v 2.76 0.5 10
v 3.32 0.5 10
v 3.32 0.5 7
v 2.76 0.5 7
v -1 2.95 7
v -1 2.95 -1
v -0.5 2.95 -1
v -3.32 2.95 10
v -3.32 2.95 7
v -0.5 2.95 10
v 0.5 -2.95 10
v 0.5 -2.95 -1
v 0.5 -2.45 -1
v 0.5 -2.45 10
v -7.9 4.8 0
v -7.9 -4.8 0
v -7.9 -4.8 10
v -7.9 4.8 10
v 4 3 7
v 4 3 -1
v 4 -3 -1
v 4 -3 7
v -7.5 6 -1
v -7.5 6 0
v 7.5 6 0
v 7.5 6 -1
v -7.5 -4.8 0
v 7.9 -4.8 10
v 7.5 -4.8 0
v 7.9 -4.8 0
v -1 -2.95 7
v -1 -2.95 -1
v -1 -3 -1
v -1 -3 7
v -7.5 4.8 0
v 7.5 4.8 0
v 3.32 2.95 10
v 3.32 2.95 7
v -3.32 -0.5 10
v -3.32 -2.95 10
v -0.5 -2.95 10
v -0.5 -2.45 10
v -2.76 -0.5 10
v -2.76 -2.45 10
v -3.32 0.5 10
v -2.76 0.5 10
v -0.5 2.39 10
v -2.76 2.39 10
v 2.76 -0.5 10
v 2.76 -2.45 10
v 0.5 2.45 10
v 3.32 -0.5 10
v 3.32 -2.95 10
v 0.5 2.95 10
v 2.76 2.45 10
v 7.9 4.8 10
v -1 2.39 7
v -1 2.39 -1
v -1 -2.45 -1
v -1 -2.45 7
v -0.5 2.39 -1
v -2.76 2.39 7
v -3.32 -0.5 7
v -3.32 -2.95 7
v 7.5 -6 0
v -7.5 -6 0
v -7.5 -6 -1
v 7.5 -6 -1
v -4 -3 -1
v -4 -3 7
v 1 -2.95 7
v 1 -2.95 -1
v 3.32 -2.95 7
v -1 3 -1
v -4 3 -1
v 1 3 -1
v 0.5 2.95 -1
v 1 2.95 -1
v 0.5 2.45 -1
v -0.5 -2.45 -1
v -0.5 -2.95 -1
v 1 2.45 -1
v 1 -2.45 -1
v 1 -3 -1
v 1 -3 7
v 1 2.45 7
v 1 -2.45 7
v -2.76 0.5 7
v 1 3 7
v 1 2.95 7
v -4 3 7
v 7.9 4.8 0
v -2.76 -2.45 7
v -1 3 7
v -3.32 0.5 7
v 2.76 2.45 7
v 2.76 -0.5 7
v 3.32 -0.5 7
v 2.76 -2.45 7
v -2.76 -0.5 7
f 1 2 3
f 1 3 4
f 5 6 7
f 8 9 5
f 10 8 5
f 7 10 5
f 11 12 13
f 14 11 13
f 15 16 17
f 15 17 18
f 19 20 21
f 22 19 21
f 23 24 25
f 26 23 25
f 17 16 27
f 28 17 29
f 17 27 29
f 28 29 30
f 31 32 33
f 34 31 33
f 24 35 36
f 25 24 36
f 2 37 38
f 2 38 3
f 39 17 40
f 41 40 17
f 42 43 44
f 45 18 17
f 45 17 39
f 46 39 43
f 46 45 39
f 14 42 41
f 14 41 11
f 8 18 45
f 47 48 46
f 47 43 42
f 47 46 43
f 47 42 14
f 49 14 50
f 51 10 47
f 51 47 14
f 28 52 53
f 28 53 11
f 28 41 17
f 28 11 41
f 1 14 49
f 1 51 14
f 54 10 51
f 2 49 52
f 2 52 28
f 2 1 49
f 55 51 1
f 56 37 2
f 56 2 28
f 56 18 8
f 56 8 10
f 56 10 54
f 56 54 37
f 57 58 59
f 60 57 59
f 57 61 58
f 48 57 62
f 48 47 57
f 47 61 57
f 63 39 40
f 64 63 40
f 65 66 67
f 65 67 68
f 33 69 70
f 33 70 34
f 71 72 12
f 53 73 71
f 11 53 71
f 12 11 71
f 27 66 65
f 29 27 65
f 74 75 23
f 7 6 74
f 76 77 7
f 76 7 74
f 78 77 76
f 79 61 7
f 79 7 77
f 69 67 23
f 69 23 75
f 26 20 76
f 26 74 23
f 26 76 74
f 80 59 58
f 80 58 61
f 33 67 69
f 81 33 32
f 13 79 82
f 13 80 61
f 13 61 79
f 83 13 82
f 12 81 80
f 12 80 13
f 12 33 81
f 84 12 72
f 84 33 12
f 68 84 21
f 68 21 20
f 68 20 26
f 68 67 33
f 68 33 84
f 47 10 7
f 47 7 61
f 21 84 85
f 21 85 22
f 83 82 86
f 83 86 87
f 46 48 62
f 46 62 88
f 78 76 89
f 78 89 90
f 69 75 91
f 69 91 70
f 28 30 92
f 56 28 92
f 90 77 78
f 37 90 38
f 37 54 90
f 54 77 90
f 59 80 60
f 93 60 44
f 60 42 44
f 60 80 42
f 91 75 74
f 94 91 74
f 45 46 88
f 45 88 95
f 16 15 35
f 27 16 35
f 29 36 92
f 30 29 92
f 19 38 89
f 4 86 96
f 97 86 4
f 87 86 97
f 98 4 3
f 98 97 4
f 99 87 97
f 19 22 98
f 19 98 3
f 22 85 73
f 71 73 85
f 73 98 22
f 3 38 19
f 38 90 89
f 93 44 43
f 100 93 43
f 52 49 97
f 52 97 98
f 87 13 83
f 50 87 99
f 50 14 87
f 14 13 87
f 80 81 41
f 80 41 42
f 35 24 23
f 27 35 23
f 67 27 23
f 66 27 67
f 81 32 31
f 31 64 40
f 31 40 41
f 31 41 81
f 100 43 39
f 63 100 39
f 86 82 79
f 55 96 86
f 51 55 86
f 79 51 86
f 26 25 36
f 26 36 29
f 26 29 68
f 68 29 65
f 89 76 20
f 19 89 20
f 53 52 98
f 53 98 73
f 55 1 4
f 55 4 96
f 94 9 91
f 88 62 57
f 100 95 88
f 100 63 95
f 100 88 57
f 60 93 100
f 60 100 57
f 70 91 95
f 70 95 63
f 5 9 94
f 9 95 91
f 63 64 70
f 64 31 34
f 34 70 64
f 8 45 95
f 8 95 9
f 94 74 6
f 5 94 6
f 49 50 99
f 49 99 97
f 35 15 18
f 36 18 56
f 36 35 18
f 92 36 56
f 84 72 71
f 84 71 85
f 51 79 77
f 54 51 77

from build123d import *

# Parameters (mm, degrees)
SKETCH_W        = 15.8
SKETCH_H        = 9.6
PAD_DEPTH       = 10
SKETCH002_W     = 15
SKETCH002_H     = 12
PAD001_DEPTH    = 1
SKETCH003_W     = 3
SKETCH003_H     = 6
POCKET_DEPTH    = 9
SKETCH004_W     = 3
SKETCH004_H     = 6
POCKET001_DEPTH = 9
POCKET002_DEPTH = 11.001
POCKET003_DEPTH = 11.001
POCKET004_DEPTH = 11.001
POCKET005_DEPTH = 11.001


with BuildPart() as part:
    # Sketch → Pad (new body)
    with BuildSketch(Plane.XY):
        Rectangle(SKETCH_W, SKETCH_H)
    extrude(amount=PAD_DEPTH)

    # Sketch002 → Pad001 (join)
    with BuildSketch(Plane(origin=(0, 0, 0), x_dir=(1, 0, 0), z_dir=(0, 0, -1))):
        Rectangle(SKETCH002_W, SKETCH002_H)
    extrude(amount=PAD001_DEPTH)

    # Sketch003 → Pocket (cut)
    with BuildSketch(Plane(origin=(0, 0, -2), x_dir=(1, 0, 0), z_dir=(0, 0, -1))):
        with Locations((-2.5, 0)):
            Rectangle(SKETCH003_W, SKETCH003_H)
    extrude(amount=-POCKET_DEPTH, mode=Mode.SUBTRACT)

    # Sketch004 → Pocket001 (cut)
    with BuildSketch(Plane(origin=(0, 0, -2), x_dir=(1, 0, 0), z_dir=(0, 0, -1))):
        with Locations((2.5, 0)):
            Rectangle(SKETCH004_W, SKETCH004_H)
    extrude(amount=-POCKET001_DEPTH, mode=Mode.SUBTRACT)

    # Sketch001 → Pocket002 (cut, through all)
    with BuildSketch(Plane.XY.offset(10)):
        Polygon((3.32, -0.5), (3.32, -2.95), (0.5, -2.95), (0.5, -2.45), (2.76, -2.45), (2.76, -0.5), align=None)
    extrude(amount=-POCKET002_DEPTH, mode=Mode.SUBTRACT)

    # Sketch005 → Pocket003 (cut, through all)
    with BuildSketch(Plane.XY.offset(10)):
        Polygon((-3.32, -0.5), (-3.32, -2.95), (-0.5, -2.95), (-0.5, -2.45), (-2.76, -2.45), (-2.76, -0.5), align=None)
    extrude(amount=-POCKET003_DEPTH, mode=Mode.SUBTRACT)

    # Sketch007 → Pocket004 (cut, through all)
    with BuildSketch(Plane.XY.offset(10)):
        Polygon((-2.76, 0.5), (-3.32, 0.5), (-3.32, 2.95), (-0.5, 2.95), (-0.5, 2.39), (-2.76, 2.39), align=None)
    extrude(amount=-POCKET004_DEPTH, mode=Mode.SUBTRACT)

    # Sketch006 → Pocket005 (cut, through all)
    with BuildSketch(Plane.XY.offset(10)):
        Polygon((0.5, 2.95), (3.32, 2.95), (3.32, 0.5), (2.76, 0.5), (2.76, 2.45), (0.5, 2.45), align=None)
    extrude(amount=-POCKET005_DEPTH, mode=Mode.SUBTRACT)


solid = part.part
